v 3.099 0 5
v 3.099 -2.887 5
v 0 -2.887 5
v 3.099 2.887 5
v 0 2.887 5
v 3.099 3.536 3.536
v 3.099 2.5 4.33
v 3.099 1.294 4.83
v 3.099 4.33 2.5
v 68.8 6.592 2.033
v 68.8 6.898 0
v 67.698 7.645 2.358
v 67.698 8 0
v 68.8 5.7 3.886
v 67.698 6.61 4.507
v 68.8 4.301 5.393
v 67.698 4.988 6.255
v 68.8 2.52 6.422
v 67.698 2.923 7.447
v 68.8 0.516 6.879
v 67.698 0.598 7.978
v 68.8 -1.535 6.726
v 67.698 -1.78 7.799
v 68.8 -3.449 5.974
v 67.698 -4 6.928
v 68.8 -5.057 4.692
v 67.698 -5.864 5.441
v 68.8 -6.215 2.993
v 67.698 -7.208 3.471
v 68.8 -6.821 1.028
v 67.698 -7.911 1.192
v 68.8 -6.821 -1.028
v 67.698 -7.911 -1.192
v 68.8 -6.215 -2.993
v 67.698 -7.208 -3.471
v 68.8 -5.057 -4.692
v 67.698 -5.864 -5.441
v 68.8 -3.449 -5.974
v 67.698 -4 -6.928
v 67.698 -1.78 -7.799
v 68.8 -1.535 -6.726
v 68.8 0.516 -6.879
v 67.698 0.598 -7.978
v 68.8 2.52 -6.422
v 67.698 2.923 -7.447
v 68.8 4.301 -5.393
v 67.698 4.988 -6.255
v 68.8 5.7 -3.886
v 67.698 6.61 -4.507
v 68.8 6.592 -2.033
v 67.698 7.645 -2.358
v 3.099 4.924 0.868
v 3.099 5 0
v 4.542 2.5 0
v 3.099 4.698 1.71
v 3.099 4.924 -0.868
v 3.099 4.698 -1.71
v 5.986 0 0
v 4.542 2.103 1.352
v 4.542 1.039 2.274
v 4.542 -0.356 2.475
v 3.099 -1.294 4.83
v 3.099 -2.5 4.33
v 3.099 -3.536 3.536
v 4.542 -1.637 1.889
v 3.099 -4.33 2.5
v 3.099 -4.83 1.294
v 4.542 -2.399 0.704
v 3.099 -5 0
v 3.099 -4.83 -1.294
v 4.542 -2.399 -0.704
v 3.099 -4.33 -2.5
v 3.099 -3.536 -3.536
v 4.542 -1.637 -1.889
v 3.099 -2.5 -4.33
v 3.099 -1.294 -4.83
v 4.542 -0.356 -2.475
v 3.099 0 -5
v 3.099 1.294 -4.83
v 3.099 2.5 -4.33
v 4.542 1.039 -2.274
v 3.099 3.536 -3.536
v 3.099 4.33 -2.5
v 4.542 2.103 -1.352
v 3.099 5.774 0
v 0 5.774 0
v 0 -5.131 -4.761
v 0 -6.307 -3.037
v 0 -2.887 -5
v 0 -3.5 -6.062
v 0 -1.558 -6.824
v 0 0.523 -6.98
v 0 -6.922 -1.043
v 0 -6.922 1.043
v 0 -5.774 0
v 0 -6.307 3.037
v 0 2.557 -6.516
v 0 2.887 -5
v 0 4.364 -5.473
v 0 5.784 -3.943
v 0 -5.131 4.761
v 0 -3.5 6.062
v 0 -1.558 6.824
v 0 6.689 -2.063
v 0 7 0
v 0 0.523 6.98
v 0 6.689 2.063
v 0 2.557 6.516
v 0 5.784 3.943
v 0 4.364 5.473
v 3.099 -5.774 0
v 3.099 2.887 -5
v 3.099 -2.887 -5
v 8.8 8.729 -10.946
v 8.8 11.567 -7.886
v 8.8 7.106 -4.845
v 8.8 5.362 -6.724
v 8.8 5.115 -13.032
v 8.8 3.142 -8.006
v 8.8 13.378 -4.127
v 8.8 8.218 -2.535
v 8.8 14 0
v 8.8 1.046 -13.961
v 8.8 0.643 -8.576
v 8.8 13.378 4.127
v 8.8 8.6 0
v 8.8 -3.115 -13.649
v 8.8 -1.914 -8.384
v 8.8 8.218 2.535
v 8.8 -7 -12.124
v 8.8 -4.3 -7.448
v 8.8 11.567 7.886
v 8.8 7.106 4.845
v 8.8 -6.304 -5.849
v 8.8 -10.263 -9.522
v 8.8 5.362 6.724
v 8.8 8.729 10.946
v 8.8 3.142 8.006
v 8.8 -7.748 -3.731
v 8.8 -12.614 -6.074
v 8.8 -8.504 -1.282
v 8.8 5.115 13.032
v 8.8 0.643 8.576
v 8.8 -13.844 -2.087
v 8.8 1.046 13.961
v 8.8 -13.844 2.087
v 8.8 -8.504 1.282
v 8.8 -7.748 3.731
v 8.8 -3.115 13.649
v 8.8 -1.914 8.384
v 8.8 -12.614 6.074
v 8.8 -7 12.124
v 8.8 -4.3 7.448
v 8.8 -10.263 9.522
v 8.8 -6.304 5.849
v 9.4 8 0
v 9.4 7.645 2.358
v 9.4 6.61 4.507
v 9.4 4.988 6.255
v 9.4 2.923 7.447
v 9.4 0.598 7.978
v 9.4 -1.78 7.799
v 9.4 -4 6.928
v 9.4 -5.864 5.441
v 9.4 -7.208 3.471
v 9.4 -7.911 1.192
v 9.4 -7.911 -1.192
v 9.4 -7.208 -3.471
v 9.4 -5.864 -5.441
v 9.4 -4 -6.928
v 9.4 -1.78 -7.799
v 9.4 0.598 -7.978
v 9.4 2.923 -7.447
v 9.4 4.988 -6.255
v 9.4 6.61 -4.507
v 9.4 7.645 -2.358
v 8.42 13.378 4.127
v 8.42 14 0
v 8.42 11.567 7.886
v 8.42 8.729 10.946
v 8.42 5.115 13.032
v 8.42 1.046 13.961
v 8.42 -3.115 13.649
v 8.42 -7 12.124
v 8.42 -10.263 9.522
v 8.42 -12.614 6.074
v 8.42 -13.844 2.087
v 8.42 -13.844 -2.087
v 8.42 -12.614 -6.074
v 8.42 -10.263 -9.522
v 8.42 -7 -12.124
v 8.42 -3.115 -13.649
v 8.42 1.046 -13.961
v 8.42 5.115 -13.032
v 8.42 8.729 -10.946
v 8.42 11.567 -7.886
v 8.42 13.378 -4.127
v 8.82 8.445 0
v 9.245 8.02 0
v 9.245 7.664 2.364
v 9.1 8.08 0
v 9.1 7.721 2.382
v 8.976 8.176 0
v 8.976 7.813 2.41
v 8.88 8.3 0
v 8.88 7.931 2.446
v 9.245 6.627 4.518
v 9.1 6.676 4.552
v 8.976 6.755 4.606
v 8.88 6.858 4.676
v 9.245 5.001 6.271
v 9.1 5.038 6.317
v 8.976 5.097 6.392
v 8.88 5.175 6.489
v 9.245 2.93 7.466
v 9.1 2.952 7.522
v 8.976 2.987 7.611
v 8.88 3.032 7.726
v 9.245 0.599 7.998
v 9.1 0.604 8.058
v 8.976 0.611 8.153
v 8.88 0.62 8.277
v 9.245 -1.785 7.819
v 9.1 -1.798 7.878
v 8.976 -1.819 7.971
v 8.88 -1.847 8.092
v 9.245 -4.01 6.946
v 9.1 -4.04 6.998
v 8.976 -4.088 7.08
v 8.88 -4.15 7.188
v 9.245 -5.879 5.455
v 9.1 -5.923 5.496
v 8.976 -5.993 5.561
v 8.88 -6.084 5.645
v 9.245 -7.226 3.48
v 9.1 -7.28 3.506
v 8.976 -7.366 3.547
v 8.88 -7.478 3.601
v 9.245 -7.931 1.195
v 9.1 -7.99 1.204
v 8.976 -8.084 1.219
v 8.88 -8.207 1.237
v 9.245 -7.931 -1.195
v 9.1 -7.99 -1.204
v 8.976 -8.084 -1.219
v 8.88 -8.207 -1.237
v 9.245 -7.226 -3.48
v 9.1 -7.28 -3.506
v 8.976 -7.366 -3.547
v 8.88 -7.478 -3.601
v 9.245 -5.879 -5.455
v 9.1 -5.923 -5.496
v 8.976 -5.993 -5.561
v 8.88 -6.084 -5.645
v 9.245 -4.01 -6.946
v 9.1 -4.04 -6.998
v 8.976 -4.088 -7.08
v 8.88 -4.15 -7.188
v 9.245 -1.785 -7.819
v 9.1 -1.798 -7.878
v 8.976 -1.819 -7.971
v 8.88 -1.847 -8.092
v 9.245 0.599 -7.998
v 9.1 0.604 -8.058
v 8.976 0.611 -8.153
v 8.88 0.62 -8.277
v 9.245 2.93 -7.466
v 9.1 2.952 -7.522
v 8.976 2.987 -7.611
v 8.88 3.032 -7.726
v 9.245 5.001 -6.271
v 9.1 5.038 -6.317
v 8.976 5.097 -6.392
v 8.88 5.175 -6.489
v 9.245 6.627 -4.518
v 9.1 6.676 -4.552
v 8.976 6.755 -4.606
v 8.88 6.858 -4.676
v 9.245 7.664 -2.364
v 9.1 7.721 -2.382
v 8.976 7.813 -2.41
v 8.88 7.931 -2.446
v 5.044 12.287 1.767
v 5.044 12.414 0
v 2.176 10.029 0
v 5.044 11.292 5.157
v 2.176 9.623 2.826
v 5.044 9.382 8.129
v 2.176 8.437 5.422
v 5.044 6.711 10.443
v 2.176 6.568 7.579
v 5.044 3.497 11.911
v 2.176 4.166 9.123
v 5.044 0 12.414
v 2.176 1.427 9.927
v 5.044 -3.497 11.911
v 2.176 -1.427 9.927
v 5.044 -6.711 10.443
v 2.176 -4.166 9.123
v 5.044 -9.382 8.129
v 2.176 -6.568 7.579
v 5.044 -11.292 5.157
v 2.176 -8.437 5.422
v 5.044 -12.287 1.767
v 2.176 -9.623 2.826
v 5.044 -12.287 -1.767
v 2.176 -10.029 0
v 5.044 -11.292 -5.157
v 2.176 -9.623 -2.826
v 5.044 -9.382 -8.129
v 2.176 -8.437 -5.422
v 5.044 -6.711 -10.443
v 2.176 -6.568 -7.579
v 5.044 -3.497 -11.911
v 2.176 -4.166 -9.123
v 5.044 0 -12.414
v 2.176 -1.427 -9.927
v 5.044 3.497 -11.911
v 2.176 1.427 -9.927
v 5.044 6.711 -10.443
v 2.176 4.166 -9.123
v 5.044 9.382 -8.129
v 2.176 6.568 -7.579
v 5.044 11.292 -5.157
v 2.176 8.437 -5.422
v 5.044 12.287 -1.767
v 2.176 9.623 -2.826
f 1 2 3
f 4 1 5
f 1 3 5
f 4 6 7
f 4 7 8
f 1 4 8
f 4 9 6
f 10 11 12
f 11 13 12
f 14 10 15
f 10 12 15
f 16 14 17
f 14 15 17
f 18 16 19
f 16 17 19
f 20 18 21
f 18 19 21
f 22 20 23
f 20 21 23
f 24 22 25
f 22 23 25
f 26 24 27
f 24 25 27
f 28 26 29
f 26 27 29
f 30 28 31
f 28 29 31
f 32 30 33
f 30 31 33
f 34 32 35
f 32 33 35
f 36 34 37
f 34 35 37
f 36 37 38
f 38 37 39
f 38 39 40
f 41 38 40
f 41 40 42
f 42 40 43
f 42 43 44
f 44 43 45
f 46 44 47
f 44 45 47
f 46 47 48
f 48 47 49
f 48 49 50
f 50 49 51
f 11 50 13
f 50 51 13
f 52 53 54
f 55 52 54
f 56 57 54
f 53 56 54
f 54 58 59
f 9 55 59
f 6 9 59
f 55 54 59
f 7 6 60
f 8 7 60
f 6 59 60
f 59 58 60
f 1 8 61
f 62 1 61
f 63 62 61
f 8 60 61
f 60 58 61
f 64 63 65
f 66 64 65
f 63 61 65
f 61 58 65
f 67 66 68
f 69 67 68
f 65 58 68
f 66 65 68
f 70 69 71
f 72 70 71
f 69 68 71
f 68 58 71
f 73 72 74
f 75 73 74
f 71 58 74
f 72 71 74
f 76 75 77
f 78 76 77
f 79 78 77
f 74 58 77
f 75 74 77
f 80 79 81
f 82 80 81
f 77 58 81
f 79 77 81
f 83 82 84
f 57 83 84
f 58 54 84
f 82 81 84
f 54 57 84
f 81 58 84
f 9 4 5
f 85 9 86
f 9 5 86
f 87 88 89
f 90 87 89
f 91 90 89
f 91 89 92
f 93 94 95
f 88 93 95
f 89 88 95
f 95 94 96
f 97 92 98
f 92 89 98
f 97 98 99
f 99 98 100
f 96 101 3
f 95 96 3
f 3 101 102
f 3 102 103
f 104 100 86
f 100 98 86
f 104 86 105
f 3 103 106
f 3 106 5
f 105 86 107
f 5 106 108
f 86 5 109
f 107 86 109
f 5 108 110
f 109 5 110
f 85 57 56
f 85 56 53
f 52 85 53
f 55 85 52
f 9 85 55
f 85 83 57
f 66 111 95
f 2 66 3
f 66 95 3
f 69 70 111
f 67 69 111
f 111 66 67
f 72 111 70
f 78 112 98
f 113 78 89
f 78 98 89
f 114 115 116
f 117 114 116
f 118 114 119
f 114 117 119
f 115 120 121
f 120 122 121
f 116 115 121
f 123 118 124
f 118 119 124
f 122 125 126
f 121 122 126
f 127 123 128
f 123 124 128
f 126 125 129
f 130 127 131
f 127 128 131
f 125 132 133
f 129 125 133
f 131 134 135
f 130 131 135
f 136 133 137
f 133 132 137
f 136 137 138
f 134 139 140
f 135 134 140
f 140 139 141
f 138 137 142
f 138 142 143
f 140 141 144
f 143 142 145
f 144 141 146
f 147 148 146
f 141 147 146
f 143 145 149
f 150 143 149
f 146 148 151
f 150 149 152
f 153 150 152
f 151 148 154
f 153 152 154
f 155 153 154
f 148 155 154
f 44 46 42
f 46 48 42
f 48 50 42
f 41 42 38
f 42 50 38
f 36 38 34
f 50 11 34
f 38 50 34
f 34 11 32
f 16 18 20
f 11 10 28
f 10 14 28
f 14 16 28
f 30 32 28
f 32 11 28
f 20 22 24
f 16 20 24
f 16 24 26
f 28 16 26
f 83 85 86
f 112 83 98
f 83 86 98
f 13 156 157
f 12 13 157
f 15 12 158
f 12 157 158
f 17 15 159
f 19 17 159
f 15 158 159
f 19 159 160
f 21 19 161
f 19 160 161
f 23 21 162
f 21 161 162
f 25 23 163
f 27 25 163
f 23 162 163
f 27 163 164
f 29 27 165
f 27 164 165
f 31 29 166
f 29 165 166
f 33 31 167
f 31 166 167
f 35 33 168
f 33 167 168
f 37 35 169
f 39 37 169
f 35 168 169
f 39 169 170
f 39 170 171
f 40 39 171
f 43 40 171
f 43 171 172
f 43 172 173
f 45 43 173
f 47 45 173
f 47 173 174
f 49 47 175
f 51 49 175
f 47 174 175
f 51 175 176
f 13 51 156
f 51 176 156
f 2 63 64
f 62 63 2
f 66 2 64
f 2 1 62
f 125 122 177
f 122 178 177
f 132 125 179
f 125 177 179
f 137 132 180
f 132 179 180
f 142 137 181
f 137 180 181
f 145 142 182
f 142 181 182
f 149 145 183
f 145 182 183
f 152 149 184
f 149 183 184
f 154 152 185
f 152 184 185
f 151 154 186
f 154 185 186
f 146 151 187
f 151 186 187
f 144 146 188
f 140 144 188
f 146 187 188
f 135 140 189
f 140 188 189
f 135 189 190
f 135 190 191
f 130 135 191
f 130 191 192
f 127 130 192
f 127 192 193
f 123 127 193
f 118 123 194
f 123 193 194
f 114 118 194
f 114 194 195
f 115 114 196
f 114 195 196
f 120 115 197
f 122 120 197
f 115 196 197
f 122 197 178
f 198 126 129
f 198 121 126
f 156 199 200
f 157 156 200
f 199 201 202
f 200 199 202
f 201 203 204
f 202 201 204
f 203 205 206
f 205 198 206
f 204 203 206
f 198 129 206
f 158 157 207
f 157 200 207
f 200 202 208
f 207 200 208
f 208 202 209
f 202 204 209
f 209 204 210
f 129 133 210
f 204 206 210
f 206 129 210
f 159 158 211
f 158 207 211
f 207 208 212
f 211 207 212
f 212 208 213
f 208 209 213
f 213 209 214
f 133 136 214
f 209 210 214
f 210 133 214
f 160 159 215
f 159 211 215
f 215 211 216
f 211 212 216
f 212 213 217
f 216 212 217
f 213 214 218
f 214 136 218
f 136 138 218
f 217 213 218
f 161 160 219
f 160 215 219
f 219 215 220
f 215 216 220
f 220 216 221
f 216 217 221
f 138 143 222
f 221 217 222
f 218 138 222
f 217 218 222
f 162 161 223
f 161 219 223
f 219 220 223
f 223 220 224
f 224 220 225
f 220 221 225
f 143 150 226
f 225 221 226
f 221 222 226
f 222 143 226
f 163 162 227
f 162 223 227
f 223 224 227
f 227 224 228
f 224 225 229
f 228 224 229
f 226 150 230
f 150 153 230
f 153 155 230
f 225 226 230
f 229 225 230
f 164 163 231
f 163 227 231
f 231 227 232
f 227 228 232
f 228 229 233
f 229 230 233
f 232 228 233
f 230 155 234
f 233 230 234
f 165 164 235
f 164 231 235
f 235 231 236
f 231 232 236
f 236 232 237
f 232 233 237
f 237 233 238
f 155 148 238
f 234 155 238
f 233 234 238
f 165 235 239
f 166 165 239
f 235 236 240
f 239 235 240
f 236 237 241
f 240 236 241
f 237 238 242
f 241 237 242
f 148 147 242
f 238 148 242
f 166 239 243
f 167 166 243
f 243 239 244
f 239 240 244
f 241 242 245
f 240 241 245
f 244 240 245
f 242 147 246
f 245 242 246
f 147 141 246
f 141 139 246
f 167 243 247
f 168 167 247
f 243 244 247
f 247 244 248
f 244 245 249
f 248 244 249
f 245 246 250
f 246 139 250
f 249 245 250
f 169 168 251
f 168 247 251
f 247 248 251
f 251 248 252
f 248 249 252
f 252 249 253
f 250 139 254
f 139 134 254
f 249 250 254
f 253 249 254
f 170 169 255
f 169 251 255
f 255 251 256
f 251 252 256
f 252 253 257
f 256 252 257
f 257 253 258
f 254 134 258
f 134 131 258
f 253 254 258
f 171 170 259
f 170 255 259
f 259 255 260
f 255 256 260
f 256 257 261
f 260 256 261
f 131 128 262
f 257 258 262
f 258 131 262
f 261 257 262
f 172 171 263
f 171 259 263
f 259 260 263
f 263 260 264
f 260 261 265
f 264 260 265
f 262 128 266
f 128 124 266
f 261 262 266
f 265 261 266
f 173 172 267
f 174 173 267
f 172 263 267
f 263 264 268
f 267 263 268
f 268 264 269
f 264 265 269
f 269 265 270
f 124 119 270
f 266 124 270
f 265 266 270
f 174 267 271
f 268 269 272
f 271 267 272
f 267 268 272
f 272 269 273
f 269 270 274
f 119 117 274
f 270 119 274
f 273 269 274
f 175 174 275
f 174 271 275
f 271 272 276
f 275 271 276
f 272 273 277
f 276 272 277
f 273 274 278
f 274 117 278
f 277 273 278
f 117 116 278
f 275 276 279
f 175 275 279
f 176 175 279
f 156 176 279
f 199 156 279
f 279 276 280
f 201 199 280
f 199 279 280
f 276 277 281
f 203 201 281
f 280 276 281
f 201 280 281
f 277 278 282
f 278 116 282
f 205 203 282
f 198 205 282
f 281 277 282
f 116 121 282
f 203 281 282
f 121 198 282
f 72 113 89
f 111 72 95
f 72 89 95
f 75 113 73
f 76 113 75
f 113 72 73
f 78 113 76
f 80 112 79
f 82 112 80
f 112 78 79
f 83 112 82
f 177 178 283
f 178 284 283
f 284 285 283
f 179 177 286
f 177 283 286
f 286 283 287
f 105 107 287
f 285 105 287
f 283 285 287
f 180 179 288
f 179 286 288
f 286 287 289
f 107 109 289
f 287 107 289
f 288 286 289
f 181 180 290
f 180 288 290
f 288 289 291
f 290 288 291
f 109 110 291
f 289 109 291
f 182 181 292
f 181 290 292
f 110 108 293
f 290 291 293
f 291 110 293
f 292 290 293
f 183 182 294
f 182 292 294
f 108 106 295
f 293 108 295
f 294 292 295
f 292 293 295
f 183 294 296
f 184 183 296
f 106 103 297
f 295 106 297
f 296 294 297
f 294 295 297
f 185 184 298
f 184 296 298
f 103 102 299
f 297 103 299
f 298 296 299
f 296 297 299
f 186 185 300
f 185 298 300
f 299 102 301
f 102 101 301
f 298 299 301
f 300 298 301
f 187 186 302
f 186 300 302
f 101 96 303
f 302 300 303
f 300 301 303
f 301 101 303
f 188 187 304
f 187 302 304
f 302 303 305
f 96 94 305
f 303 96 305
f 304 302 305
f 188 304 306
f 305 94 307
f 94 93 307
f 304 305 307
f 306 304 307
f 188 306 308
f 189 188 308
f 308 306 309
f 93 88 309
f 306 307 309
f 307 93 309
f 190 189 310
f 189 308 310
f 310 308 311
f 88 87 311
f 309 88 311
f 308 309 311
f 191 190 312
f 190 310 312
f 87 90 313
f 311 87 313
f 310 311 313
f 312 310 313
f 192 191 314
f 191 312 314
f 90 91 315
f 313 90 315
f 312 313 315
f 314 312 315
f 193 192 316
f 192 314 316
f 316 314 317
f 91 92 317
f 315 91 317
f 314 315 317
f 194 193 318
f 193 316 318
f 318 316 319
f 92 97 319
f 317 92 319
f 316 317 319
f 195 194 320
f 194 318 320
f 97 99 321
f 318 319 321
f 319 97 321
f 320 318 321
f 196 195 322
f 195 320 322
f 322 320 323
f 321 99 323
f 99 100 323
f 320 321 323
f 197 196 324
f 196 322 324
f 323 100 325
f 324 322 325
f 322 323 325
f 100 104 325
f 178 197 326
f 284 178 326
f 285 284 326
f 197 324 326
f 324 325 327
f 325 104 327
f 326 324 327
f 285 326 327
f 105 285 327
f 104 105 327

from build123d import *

# Parameters (mm, degrees)
FILLET1_R   = 0.6
HEX_2_DEPTH = 3.0988


with BuildPart() as part:
    # BodySke → BaseBody (revolve)
    with BuildSketch(Plane.XY):
        with BuildLine():
            Line((68.8, 0), (68.8, 6.8985))
            Line((68.8, 6.8985), (67.6985, 8))
            Line((67.6985, 8), (8.8, 8))
            Line((8.8, 8), (8.8, 14))
            Line((8.8, 14), (8.42, 14))
            ThreePointArc((8.42, 14), (3.53447189, 11.312563812), (0, 7))
            Line((0, 7), (0, 0))
            Line((0, 0), (68.8, 0))
        make_face()
    revolve(axis=Axis((0, 0, 0), (1, 0, 0)))

    # Fillet1
    fillet1_edges = [part.edges().sort_by_distance(p)[0] for p in [
        (8.8, -8, 0),
    ]]
    fillet(fillet1_edges, radius=FILLET1_R)

    # Sketch2 → PreBroach (revolve, cut)
    with BuildSketch(Plane.XY):
        Polygon((0, 5), (3.0988, 5), (5.985551346, 0), (0, 0), align=None)
    revolve(axis=Axis((0, 0, 0), (1, 0, 0)), mode=Mode.SUBTRACT)

    # Sketch3 → Hex 2 (cut)
    with BuildSketch(Plane(origin=(0, 0, 0), x_dir=(0, 0, -1), z_dir=(1, 0, 0))):
        Polygon((-5, -2.886751346), (-5, 2.886751346), (0, 5.773502692), (5, 2.886751346), (5, -2.886751346), (0, -5.773502692), align=None)
    extrude(amount=HEX_2_DEPTH, mode=Mode.SUBTRACT)


solid = part.part
